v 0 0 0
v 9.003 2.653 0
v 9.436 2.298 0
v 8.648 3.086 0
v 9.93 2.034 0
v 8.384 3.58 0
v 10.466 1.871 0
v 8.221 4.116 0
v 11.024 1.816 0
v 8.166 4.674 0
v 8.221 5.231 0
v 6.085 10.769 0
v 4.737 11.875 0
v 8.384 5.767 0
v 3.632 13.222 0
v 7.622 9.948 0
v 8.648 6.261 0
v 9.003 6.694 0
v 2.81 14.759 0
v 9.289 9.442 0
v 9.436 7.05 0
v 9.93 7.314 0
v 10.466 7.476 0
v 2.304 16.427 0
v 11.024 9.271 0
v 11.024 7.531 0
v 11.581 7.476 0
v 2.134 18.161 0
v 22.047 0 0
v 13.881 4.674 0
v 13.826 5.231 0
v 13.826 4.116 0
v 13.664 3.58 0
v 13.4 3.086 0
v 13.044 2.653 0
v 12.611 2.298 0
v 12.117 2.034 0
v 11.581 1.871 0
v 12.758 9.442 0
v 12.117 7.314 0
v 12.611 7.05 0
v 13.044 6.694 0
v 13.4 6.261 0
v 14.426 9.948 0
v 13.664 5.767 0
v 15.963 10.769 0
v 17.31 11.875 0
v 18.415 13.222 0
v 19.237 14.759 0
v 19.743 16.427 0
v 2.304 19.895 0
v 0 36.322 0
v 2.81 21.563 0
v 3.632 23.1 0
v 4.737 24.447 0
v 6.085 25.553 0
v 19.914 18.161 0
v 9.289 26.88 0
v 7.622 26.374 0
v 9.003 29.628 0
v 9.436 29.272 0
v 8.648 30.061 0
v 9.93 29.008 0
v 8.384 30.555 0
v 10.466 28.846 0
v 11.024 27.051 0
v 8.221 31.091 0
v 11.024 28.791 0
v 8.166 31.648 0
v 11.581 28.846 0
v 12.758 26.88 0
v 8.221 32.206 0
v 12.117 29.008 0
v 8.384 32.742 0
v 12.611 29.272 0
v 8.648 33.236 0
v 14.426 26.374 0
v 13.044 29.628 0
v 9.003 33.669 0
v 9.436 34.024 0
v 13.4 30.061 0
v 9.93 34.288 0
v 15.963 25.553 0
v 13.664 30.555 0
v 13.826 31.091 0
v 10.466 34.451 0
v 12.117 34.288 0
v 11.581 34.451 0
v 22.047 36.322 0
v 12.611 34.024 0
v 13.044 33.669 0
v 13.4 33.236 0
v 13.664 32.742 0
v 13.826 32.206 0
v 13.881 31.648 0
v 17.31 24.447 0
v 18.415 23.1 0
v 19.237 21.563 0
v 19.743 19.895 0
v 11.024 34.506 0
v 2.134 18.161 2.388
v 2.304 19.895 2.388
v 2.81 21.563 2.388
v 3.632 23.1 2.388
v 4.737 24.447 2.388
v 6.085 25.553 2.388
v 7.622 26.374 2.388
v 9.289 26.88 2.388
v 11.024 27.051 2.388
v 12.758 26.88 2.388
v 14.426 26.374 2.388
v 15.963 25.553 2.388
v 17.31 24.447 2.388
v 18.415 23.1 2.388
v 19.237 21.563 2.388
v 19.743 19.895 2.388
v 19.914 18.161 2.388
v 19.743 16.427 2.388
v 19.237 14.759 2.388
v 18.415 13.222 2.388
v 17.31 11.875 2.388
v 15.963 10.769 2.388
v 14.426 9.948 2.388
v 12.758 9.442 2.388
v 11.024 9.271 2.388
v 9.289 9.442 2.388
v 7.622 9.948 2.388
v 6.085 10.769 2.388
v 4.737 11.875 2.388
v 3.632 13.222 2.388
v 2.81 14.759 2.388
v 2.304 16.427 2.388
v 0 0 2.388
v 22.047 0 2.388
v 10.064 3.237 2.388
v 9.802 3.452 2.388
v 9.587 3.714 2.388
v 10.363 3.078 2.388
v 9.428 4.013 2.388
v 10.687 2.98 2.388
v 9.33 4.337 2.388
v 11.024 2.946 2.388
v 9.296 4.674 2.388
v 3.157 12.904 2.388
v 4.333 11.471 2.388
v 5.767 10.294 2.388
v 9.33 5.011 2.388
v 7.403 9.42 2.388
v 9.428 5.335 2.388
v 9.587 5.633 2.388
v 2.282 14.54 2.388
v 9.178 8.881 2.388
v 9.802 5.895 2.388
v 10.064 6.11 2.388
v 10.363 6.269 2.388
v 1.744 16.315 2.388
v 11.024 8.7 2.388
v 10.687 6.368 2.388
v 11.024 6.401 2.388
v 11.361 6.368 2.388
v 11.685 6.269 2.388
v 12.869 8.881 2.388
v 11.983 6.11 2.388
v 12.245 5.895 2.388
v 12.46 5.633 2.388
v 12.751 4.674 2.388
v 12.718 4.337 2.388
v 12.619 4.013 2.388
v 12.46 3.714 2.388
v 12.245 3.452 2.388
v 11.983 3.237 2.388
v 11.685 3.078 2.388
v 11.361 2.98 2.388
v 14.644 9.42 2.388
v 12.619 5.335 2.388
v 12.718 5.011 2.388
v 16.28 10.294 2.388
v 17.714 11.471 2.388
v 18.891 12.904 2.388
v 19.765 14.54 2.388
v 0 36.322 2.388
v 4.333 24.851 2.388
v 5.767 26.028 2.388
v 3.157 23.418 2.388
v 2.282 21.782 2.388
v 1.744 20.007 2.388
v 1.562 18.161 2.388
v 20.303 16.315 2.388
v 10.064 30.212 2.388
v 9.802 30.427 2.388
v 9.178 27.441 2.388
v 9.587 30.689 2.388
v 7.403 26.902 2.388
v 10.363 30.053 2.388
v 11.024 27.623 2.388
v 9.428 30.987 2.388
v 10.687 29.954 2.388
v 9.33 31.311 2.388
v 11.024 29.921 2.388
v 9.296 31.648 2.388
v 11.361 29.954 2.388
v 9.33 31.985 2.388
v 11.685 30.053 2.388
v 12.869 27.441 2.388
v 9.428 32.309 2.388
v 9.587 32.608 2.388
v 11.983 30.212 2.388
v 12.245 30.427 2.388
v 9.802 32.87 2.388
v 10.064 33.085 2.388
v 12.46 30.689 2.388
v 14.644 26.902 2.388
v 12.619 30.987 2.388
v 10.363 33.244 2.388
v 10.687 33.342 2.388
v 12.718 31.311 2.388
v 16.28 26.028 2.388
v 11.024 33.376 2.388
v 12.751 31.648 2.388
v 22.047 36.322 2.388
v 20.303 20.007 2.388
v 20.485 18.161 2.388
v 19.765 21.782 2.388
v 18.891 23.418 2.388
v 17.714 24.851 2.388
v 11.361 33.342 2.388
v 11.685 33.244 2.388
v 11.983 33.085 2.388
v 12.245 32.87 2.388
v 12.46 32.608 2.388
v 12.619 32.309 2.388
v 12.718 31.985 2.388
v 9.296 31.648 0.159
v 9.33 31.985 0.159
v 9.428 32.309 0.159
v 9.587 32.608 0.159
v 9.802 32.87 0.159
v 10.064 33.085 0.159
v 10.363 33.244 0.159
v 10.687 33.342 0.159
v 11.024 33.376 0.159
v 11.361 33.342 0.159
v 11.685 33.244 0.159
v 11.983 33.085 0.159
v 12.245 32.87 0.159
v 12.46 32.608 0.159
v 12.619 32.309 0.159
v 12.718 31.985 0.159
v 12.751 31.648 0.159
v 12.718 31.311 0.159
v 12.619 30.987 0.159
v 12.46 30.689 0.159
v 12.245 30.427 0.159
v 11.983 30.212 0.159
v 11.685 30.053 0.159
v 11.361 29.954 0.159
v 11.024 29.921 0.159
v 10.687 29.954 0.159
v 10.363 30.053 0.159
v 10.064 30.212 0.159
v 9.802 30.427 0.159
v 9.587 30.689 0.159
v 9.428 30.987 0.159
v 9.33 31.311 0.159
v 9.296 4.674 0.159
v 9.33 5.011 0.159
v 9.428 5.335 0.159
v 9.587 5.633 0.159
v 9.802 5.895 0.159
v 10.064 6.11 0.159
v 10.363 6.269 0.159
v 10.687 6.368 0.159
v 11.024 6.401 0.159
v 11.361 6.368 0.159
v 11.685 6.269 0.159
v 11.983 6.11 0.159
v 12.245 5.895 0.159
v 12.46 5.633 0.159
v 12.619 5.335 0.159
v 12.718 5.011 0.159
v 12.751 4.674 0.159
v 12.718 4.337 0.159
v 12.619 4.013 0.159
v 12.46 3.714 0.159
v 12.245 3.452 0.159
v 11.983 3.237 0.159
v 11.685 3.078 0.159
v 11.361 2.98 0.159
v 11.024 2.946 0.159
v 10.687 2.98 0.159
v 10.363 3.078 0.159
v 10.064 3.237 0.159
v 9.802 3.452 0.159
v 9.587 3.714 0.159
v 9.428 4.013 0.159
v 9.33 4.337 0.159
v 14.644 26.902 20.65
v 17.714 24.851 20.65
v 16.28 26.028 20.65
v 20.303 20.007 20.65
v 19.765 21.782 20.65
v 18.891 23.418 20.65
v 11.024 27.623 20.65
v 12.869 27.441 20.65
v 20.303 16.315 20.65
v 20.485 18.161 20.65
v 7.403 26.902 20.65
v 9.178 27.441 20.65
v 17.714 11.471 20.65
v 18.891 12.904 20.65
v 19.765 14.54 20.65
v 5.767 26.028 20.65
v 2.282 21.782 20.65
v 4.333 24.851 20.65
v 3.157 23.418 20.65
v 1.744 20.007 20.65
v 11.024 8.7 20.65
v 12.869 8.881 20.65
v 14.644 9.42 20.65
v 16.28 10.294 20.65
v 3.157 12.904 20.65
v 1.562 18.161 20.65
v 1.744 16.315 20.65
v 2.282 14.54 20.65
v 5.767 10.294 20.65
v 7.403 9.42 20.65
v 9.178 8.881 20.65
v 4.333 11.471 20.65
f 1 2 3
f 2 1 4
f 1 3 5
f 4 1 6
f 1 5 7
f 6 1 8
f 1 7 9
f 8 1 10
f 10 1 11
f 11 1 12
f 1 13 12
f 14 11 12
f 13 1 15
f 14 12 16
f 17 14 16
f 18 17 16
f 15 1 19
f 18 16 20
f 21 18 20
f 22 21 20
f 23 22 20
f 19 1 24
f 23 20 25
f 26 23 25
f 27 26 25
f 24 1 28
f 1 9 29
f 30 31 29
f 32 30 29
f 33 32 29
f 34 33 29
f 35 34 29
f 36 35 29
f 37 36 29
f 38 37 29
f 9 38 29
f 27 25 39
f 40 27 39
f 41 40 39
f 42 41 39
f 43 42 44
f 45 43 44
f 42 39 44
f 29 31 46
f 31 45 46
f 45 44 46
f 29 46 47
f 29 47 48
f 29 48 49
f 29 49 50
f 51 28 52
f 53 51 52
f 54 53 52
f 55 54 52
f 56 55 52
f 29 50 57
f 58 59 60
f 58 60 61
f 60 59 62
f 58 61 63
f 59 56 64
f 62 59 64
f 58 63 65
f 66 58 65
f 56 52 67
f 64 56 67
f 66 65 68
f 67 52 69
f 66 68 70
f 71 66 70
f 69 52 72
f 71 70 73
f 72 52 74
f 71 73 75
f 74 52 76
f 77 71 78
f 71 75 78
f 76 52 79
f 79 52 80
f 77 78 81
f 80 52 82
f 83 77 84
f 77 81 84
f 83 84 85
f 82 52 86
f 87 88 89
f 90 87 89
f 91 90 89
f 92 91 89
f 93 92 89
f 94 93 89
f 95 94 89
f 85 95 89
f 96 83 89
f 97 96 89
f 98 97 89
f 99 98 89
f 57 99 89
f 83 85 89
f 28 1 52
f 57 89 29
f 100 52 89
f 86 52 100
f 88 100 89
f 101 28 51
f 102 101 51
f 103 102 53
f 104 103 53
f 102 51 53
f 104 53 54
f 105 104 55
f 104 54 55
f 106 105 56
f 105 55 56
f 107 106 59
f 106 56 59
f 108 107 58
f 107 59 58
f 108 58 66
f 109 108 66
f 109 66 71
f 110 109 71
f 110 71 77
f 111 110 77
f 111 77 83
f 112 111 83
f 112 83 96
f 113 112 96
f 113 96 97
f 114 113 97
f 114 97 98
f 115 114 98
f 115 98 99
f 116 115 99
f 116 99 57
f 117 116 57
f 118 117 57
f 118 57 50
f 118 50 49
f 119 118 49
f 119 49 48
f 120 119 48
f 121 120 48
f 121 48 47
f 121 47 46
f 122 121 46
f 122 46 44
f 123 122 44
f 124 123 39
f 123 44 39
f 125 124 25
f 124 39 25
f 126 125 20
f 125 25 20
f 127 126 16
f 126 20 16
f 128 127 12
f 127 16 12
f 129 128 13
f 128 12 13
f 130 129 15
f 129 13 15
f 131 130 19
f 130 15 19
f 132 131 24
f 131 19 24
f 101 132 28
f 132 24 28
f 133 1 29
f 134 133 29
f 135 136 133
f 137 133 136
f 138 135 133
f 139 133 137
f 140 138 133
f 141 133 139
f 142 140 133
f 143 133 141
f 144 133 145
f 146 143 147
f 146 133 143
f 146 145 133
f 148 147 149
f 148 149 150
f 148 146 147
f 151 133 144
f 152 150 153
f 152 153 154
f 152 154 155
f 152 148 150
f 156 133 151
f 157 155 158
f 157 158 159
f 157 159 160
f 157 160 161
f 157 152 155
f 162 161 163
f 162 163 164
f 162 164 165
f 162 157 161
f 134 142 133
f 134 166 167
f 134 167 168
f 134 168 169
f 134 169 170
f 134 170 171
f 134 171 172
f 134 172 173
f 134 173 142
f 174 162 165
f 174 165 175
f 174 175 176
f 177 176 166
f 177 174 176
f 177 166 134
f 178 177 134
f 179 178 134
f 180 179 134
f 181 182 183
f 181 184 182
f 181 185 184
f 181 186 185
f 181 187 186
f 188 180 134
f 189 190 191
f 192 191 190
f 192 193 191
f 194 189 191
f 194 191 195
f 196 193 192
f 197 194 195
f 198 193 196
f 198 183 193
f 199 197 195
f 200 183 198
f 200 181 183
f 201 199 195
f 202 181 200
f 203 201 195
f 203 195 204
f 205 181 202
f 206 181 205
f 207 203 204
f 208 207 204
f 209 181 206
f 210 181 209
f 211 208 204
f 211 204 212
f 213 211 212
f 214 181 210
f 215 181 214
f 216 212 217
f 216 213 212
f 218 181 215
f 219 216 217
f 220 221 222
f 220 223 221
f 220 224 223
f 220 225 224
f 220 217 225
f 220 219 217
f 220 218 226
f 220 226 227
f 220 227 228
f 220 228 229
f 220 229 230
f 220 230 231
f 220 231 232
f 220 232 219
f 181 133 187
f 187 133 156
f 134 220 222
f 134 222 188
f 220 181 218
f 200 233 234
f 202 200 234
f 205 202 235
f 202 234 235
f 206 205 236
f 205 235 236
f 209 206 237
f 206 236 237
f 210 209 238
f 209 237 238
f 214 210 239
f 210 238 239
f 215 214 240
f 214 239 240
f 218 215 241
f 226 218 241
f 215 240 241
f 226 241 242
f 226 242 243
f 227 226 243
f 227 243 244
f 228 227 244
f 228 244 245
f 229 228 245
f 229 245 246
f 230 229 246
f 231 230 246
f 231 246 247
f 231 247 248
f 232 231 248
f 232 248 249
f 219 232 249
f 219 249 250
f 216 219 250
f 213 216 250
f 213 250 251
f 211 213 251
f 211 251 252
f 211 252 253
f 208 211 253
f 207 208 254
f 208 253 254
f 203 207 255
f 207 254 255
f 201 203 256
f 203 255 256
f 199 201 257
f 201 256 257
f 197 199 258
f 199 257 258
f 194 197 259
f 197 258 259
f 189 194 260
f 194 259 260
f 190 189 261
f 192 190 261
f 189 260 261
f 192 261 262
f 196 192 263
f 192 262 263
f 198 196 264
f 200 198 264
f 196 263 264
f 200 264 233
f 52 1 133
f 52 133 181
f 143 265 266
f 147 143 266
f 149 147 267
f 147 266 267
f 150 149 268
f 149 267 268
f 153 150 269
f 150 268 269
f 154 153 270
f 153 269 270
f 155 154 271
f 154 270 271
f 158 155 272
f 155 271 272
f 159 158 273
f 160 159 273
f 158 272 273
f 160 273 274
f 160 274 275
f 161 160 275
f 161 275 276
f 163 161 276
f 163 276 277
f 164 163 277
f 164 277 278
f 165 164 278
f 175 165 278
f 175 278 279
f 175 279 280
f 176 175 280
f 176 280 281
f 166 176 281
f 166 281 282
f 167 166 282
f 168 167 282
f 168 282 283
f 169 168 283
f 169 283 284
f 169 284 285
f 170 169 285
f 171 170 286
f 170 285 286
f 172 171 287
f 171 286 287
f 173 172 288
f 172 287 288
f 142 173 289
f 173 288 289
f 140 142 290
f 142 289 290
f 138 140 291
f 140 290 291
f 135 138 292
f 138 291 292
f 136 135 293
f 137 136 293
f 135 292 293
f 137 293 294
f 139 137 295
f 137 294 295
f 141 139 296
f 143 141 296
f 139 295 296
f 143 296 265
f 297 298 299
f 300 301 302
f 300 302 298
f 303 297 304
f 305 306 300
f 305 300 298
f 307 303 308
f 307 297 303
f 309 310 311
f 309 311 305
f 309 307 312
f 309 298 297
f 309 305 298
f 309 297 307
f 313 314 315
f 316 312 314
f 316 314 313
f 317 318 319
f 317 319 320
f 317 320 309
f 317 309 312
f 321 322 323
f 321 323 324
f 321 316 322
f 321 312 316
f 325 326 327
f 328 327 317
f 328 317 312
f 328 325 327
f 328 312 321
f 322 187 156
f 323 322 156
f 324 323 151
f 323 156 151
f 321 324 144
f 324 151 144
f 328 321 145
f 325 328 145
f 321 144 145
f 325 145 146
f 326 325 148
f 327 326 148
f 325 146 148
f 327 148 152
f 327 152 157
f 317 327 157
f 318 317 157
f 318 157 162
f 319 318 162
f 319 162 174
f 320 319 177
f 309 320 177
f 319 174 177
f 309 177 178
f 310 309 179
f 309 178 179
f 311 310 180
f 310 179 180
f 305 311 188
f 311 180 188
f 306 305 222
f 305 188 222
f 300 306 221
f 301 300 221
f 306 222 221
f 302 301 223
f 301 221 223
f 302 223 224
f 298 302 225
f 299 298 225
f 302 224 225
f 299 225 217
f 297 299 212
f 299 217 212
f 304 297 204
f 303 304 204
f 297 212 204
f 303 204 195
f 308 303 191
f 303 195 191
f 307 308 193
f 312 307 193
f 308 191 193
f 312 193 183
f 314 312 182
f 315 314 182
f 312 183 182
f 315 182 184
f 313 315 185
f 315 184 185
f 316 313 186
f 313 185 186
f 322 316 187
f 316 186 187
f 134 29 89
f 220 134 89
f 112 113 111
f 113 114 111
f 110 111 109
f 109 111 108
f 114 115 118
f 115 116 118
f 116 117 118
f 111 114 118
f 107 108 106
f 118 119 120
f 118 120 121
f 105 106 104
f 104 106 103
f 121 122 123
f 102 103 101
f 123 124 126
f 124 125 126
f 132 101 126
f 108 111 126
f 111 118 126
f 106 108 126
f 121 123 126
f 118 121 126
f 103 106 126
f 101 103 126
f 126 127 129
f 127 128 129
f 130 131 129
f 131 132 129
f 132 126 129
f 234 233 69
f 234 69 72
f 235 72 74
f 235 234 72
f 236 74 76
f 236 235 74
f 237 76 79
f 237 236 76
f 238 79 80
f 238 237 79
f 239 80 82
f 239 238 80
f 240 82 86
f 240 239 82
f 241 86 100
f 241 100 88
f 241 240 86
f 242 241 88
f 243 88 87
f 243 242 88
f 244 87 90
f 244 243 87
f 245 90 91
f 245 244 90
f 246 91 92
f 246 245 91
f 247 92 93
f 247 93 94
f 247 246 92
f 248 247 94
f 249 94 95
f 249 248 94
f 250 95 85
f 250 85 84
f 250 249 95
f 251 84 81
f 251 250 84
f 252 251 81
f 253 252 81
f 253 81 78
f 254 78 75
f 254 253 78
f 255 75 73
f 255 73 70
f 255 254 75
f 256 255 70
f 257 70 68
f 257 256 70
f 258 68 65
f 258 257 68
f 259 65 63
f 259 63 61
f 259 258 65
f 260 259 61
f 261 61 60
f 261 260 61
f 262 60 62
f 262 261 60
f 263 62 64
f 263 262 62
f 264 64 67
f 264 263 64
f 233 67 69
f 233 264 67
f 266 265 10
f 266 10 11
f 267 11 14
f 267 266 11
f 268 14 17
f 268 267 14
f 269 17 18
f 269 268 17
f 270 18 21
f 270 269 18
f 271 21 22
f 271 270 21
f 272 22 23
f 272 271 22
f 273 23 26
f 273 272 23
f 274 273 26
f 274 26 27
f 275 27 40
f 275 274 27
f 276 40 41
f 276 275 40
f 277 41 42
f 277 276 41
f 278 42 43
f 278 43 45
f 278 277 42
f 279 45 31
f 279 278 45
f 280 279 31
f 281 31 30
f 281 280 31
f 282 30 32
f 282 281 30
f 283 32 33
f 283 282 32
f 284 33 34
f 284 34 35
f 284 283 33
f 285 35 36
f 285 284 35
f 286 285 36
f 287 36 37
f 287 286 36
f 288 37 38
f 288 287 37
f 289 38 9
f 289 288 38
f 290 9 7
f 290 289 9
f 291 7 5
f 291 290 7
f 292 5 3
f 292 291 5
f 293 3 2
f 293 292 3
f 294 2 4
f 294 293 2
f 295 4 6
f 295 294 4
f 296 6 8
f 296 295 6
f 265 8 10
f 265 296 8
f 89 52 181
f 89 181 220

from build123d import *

# Parameters (mm, degrees)
SKETCH1_W           = 22.0472
SKETCH1_H           = 36.322
BOSS_EXTRUDE1_DEPTH = 2.3876
CUT_EXTRUDE1_REACH  = 44.557
SKETCH2_R           = 1.7272
SKETCH2_R_2         = 8.89
SKETCH3_R           = 9.4615
BOSS_EXTRUDE2_DEPTH = 18.2626
CHAMFER1_SIZE       = 1.1303
CHAMFER1_SIZE2      = 0.158853305


with BuildPart() as part:
    # Sketch1 → Boss-Extrude1 (new body)
    with BuildSketch(Plane.XY):
        with Locations((11.0236, 18.161)):
            Rectangle(SKETCH1_W, SKETCH1_H)
    extrude(amount=BOSS_EXTRUDE1_DEPTH)

    # Sketch2 → Cut-Extrude1 (cut, up to next)
    with BuildSketch(Plane(origin=(0, 0, 0), x_dir=(-1, 0, 0), z_dir=(0, 0, -1)), mode=Mode.PRIVATE) as cut_extrude1_sk1:
        with Locations((-11.0236, 31.6484)):
            Circle(SKETCH2_R)
    cut_extrude1_tool1 = extrude(cut_extrude1_sk1.sketch, amount=-CUT_EXTRUDE1_REACH, mode=Mode.PRIVATE) & part.part
    # Sketch2 → Cut-Extrude1 (cut, up to next)
    with BuildSketch(Plane(origin=(0, 0, 0), x_dir=(-1, 0, 0), z_dir=(0, 0, -1)), mode=Mode.PRIVATE) as cut_extrude1_sk2:
        with Locations((-11.0236, 4.6736)):
            Circle(SKETCH2_R)
    cut_extrude1_tool2 = extrude(cut_extrude1_sk2.sketch, amount=-CUT_EXTRUDE1_REACH, mode=Mode.PRIVATE) & part.part
    # Sketch2 → Cut-Extrude1 (cut, up to next)
    with BuildSketch(Plane(origin=(0, 0, 0), x_dir=(-1, 0, 0), z_dir=(0, 0, -1)), mode=Mode.PRIVATE) as cut_extrude1_sk3:
        with Locations((-11.0236, 18.161)):
            Circle(SKETCH2_R_2)
    cut_extrude1_tool3 = extrude(cut_extrude1_sk3.sketch, amount=-CUT_EXTRUDE1_REACH, mode=Mode.PRIVATE) & part.part
    add(cut_extrude1_tool1.solids().sort_by_distance((11.0236, 31.6484, 0))[0], mode=Mode.SUBTRACT)
    add(cut_extrude1_tool2.solids().sort_by_distance((11.0236, 4.6736, 0))[0], mode=Mode.SUBTRACT)
    add(cut_extrude1_tool3.solids().sort_by_distance((11.0236, 18.161, 0))[0], mode=Mode.SUBTRACT)

    # Sketch3 → Boss-Extrude2 (add)
    with BuildSketch(Plane.XY.offset(2.3876)):
        with Locations(Location((11.0236, 18.161, 0), (0, 0, 180))):
            Circle(SKETCH3_R)
    extrude(amount=BOSS_EXTRUDE2_DEPTH)

    # Chamfer1
    chamfer1_edges = [part.edges().sort_by_distance(p)[0] for p in [
        (12.7508, 31.6484, 0),
        (12.7508, 4.6736, 0),
    ]]
    chamfer1_side = [part.faces().sort_by_distance(p)[0] for p in [
        (11.0236, 0.424896071, 0),
    ]]
    chamfer(chamfer1_edges, length=CHAMFER1_SIZE, length2=CHAMFER1_SIZE2, reference=chamfer1_side[0])


solid = part.part
